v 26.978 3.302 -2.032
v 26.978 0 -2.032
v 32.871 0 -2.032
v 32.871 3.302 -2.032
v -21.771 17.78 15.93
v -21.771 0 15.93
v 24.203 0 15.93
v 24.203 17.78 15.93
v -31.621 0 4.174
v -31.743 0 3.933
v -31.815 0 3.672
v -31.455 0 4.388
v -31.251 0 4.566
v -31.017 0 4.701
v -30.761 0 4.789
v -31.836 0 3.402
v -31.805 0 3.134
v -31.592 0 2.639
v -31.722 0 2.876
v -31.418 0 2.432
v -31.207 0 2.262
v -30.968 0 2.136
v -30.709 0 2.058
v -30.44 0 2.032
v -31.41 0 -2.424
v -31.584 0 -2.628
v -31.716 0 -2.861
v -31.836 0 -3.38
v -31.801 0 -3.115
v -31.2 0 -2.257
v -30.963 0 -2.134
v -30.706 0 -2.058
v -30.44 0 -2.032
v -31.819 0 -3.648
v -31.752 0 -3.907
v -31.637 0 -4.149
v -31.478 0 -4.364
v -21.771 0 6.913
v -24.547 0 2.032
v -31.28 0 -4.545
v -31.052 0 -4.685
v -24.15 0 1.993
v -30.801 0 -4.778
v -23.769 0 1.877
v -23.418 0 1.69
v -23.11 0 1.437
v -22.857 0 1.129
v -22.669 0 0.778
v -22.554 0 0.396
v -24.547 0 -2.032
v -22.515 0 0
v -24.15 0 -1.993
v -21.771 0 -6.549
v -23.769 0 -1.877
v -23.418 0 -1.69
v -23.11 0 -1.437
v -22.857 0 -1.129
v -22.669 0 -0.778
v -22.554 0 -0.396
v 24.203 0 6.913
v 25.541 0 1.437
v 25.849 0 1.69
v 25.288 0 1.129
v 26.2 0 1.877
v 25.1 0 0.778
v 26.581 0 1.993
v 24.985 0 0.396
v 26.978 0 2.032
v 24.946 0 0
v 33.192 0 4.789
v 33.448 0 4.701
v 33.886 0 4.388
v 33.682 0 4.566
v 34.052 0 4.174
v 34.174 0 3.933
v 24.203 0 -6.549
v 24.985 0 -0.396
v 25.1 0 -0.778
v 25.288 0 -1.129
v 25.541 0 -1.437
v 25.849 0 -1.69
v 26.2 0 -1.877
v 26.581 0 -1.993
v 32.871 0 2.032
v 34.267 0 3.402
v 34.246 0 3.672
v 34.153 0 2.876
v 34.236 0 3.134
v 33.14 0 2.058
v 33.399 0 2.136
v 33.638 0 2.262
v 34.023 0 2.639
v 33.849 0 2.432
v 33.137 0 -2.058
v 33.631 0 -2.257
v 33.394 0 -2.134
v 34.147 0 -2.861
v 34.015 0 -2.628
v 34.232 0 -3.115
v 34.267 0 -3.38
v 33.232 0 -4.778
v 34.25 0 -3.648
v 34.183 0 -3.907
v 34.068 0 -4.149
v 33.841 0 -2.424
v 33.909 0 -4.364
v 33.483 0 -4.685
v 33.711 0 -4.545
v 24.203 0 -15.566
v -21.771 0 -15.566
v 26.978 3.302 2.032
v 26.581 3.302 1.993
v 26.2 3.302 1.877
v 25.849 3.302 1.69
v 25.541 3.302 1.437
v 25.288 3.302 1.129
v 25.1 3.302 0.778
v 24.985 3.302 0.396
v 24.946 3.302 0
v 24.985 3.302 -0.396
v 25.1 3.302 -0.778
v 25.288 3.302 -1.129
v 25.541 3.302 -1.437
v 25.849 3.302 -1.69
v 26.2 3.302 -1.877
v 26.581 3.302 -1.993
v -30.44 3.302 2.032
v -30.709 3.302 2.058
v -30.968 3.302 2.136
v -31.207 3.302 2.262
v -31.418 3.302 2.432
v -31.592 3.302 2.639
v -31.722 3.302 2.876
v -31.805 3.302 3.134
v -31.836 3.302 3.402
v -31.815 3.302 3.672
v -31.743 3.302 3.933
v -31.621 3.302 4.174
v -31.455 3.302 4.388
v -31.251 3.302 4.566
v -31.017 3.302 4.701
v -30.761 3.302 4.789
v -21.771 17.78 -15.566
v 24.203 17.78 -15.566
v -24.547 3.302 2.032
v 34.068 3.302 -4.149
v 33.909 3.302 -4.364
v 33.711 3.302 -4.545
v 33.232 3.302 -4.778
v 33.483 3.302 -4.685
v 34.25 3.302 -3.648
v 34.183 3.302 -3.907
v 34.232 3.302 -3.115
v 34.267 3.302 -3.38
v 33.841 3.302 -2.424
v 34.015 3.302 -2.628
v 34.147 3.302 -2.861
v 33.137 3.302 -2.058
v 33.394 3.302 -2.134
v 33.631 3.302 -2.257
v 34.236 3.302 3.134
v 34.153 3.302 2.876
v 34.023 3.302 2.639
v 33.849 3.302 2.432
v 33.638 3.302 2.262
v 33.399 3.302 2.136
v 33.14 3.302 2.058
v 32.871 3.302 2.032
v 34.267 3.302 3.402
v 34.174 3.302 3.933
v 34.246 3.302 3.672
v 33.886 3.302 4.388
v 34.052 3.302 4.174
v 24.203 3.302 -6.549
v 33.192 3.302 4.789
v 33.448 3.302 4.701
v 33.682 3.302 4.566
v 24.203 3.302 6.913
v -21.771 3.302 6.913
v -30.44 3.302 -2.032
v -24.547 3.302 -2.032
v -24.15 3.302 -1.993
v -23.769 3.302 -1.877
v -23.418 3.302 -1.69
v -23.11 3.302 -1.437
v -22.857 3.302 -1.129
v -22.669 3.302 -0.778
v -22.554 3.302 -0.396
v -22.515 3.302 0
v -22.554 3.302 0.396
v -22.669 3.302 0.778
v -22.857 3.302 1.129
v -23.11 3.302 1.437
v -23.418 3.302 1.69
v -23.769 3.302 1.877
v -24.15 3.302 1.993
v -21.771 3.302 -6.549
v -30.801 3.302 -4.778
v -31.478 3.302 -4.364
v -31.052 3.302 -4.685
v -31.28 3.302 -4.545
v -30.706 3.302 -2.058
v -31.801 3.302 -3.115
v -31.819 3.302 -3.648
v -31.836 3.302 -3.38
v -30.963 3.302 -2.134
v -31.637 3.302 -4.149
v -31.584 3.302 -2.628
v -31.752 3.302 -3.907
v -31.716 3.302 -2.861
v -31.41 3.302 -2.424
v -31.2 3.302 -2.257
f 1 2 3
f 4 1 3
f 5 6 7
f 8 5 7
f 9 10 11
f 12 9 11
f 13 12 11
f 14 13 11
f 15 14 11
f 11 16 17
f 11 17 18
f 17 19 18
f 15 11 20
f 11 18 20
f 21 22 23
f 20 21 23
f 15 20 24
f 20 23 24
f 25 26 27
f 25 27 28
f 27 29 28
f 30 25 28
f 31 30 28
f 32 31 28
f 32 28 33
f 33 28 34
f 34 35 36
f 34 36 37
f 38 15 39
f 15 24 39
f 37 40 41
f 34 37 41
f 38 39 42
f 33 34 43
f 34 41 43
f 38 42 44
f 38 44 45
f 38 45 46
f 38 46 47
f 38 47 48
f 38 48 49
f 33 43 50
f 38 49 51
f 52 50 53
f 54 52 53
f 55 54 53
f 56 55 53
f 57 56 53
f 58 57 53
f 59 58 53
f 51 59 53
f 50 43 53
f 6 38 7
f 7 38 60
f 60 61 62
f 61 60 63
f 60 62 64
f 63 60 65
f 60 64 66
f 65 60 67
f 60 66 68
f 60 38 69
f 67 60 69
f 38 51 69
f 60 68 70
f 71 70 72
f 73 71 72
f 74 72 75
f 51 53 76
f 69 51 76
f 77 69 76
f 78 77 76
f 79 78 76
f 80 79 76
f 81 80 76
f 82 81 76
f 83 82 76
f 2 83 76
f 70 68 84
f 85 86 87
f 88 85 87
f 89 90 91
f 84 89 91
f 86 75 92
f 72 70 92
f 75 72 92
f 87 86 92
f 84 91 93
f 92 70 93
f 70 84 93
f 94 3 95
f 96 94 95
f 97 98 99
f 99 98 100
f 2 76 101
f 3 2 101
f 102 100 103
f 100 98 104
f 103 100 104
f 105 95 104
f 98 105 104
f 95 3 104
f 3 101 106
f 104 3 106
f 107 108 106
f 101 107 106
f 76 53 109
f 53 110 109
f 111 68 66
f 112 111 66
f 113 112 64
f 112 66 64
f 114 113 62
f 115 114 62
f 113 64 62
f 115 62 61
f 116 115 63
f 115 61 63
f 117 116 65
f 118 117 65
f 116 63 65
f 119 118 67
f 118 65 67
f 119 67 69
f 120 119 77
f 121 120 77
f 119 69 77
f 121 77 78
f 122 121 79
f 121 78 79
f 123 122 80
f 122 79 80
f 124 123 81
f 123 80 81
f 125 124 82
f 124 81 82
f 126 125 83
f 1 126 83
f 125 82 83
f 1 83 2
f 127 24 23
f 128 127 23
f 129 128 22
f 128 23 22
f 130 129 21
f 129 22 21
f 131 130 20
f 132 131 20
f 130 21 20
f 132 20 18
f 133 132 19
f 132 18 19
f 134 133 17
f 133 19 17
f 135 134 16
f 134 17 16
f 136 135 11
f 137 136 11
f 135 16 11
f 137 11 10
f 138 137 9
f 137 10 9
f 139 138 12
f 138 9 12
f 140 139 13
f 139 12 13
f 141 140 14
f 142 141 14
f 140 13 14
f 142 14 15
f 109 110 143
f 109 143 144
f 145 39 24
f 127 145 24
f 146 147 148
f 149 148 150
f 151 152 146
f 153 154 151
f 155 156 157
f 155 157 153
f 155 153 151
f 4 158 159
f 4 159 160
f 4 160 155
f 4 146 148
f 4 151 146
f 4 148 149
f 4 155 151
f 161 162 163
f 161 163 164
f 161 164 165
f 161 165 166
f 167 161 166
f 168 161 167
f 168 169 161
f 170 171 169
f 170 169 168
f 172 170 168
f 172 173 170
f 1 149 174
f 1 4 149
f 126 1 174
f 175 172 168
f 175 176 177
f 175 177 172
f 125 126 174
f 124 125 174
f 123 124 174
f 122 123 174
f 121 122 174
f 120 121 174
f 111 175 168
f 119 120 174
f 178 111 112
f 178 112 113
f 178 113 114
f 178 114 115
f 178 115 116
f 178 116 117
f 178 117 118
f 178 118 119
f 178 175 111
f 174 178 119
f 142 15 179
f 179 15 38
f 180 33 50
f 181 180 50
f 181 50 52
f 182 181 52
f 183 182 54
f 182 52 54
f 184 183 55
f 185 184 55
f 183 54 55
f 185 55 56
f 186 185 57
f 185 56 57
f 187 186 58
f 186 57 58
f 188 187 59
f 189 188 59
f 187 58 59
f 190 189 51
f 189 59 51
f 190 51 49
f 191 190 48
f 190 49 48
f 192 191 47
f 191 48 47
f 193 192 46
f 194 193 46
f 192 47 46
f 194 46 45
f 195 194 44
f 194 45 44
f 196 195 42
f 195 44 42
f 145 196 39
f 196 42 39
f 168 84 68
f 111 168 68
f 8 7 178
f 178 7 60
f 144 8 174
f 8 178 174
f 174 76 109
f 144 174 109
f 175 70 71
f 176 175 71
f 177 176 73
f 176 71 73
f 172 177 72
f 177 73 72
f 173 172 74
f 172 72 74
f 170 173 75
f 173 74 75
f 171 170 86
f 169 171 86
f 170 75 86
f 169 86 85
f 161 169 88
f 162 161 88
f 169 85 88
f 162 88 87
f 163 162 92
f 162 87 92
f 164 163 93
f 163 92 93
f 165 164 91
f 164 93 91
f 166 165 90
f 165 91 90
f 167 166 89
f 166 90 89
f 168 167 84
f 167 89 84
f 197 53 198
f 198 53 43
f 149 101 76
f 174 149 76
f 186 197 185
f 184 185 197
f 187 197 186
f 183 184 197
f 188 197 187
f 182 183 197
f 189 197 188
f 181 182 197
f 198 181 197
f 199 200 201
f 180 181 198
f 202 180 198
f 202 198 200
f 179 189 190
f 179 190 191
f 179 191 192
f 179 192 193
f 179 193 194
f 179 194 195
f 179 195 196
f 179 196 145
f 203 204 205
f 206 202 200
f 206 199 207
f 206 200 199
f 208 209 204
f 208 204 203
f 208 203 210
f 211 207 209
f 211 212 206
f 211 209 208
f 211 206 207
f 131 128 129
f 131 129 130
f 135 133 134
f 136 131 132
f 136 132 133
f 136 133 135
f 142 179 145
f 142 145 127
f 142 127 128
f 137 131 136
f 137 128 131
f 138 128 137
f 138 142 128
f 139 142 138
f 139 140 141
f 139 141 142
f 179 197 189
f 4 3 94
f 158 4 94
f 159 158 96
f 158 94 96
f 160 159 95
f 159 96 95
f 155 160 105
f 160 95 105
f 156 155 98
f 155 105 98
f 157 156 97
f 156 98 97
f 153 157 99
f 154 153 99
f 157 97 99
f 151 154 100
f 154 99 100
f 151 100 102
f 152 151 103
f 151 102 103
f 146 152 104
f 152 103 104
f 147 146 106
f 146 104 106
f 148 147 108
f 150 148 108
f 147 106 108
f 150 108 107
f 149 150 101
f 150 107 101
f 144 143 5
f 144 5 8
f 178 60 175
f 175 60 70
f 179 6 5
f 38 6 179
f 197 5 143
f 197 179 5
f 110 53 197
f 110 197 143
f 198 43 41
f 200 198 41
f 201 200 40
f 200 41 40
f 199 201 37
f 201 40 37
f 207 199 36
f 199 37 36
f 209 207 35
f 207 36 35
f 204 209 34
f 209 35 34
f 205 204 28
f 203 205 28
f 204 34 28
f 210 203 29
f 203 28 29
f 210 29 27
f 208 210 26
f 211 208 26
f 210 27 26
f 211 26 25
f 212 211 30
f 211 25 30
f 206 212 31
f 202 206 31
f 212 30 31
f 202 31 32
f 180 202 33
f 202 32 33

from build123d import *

# Parameters (mm, degrees)
SKETCH1_W           = 45.974
SKETCH1_H           = 31.496
BOSS_EXTRUDE2_DEPTH = 17.78
BOSS_EXTRUDE6_DEPTH = 3.302


with BuildPart() as part:
    # Sketch1 → Boss-Extrude2 (new body)
    with BuildSketch(Plane(origin=(0, 0, 0), x_dir=(1, 0, 0), z_dir=(0, 1, 0))):
        with Locations((1.215537396, -0.182473566)):
            Rectangle(SKETCH1_W, SKETCH1_H)
    extrude(amount=BOSS_EXTRUDE2_DEPTH)

    # Sketch2 → Boss-Extrude6 (add)
    with BuildSketch(Plane.XZ):
        with BuildLine():
            Line((-21.771462604, 6.913473566), (-21.771462604, -6.548526434))
            Line((-21.771462604, -6.548526434), (-30.800796473, -4.778472942))
            ThreePointArc((-30.800796473, -4.778472942), (-31.824571926, -3.246797777), (-30.439504653, -2.032))
            Line((-30.439504653, -2.032), (-24.546579859, -2.032))
            ThreePointArc((-24.546579859, -2.032), (-22.514579859, 0), (-24.546579859, 2.032))
            Line((-24.546579859, 2.032), (-30.439504653, 2.032))
            ThreePointArc((-30.439504653, 2.032), (-31.827108275, 3.267243429), (-30.76084181, 4.78854089))
            Line((-30.76084181, 4.78854089), (-21.771462604, 6.913473566))
        make_face()
        with BuildLine():
            Line((32.870579445, 2.032), (26.977654651, 2.032))
            ThreePointArc((26.977654651, 2.032), (24.945654651, 0), (26.977654651, -2.032))
            Line((26.977654651, -2.032), (32.870579445, -2.032))
            ThreePointArc((32.870579445, -2.032), (34.255646718, -3.246797777), (33.231871264, -4.778472942))
            Line((33.231871264, -4.778472942), (24.202537396, -6.548526434))
            Line((24.202537396, -6.548526434), (24.202537396, 6.913473566))
            Line((24.202537396, 6.913473566), (33.191916602, 4.78854089))
            ThreePointArc((33.191916602, 4.78854089), (34.258183067, 3.267243429), (32.870579445, 2.032))
        make_face()
    extrude(amount=-BOSS_EXTRUDE6_DEPTH)


solid = part.part
